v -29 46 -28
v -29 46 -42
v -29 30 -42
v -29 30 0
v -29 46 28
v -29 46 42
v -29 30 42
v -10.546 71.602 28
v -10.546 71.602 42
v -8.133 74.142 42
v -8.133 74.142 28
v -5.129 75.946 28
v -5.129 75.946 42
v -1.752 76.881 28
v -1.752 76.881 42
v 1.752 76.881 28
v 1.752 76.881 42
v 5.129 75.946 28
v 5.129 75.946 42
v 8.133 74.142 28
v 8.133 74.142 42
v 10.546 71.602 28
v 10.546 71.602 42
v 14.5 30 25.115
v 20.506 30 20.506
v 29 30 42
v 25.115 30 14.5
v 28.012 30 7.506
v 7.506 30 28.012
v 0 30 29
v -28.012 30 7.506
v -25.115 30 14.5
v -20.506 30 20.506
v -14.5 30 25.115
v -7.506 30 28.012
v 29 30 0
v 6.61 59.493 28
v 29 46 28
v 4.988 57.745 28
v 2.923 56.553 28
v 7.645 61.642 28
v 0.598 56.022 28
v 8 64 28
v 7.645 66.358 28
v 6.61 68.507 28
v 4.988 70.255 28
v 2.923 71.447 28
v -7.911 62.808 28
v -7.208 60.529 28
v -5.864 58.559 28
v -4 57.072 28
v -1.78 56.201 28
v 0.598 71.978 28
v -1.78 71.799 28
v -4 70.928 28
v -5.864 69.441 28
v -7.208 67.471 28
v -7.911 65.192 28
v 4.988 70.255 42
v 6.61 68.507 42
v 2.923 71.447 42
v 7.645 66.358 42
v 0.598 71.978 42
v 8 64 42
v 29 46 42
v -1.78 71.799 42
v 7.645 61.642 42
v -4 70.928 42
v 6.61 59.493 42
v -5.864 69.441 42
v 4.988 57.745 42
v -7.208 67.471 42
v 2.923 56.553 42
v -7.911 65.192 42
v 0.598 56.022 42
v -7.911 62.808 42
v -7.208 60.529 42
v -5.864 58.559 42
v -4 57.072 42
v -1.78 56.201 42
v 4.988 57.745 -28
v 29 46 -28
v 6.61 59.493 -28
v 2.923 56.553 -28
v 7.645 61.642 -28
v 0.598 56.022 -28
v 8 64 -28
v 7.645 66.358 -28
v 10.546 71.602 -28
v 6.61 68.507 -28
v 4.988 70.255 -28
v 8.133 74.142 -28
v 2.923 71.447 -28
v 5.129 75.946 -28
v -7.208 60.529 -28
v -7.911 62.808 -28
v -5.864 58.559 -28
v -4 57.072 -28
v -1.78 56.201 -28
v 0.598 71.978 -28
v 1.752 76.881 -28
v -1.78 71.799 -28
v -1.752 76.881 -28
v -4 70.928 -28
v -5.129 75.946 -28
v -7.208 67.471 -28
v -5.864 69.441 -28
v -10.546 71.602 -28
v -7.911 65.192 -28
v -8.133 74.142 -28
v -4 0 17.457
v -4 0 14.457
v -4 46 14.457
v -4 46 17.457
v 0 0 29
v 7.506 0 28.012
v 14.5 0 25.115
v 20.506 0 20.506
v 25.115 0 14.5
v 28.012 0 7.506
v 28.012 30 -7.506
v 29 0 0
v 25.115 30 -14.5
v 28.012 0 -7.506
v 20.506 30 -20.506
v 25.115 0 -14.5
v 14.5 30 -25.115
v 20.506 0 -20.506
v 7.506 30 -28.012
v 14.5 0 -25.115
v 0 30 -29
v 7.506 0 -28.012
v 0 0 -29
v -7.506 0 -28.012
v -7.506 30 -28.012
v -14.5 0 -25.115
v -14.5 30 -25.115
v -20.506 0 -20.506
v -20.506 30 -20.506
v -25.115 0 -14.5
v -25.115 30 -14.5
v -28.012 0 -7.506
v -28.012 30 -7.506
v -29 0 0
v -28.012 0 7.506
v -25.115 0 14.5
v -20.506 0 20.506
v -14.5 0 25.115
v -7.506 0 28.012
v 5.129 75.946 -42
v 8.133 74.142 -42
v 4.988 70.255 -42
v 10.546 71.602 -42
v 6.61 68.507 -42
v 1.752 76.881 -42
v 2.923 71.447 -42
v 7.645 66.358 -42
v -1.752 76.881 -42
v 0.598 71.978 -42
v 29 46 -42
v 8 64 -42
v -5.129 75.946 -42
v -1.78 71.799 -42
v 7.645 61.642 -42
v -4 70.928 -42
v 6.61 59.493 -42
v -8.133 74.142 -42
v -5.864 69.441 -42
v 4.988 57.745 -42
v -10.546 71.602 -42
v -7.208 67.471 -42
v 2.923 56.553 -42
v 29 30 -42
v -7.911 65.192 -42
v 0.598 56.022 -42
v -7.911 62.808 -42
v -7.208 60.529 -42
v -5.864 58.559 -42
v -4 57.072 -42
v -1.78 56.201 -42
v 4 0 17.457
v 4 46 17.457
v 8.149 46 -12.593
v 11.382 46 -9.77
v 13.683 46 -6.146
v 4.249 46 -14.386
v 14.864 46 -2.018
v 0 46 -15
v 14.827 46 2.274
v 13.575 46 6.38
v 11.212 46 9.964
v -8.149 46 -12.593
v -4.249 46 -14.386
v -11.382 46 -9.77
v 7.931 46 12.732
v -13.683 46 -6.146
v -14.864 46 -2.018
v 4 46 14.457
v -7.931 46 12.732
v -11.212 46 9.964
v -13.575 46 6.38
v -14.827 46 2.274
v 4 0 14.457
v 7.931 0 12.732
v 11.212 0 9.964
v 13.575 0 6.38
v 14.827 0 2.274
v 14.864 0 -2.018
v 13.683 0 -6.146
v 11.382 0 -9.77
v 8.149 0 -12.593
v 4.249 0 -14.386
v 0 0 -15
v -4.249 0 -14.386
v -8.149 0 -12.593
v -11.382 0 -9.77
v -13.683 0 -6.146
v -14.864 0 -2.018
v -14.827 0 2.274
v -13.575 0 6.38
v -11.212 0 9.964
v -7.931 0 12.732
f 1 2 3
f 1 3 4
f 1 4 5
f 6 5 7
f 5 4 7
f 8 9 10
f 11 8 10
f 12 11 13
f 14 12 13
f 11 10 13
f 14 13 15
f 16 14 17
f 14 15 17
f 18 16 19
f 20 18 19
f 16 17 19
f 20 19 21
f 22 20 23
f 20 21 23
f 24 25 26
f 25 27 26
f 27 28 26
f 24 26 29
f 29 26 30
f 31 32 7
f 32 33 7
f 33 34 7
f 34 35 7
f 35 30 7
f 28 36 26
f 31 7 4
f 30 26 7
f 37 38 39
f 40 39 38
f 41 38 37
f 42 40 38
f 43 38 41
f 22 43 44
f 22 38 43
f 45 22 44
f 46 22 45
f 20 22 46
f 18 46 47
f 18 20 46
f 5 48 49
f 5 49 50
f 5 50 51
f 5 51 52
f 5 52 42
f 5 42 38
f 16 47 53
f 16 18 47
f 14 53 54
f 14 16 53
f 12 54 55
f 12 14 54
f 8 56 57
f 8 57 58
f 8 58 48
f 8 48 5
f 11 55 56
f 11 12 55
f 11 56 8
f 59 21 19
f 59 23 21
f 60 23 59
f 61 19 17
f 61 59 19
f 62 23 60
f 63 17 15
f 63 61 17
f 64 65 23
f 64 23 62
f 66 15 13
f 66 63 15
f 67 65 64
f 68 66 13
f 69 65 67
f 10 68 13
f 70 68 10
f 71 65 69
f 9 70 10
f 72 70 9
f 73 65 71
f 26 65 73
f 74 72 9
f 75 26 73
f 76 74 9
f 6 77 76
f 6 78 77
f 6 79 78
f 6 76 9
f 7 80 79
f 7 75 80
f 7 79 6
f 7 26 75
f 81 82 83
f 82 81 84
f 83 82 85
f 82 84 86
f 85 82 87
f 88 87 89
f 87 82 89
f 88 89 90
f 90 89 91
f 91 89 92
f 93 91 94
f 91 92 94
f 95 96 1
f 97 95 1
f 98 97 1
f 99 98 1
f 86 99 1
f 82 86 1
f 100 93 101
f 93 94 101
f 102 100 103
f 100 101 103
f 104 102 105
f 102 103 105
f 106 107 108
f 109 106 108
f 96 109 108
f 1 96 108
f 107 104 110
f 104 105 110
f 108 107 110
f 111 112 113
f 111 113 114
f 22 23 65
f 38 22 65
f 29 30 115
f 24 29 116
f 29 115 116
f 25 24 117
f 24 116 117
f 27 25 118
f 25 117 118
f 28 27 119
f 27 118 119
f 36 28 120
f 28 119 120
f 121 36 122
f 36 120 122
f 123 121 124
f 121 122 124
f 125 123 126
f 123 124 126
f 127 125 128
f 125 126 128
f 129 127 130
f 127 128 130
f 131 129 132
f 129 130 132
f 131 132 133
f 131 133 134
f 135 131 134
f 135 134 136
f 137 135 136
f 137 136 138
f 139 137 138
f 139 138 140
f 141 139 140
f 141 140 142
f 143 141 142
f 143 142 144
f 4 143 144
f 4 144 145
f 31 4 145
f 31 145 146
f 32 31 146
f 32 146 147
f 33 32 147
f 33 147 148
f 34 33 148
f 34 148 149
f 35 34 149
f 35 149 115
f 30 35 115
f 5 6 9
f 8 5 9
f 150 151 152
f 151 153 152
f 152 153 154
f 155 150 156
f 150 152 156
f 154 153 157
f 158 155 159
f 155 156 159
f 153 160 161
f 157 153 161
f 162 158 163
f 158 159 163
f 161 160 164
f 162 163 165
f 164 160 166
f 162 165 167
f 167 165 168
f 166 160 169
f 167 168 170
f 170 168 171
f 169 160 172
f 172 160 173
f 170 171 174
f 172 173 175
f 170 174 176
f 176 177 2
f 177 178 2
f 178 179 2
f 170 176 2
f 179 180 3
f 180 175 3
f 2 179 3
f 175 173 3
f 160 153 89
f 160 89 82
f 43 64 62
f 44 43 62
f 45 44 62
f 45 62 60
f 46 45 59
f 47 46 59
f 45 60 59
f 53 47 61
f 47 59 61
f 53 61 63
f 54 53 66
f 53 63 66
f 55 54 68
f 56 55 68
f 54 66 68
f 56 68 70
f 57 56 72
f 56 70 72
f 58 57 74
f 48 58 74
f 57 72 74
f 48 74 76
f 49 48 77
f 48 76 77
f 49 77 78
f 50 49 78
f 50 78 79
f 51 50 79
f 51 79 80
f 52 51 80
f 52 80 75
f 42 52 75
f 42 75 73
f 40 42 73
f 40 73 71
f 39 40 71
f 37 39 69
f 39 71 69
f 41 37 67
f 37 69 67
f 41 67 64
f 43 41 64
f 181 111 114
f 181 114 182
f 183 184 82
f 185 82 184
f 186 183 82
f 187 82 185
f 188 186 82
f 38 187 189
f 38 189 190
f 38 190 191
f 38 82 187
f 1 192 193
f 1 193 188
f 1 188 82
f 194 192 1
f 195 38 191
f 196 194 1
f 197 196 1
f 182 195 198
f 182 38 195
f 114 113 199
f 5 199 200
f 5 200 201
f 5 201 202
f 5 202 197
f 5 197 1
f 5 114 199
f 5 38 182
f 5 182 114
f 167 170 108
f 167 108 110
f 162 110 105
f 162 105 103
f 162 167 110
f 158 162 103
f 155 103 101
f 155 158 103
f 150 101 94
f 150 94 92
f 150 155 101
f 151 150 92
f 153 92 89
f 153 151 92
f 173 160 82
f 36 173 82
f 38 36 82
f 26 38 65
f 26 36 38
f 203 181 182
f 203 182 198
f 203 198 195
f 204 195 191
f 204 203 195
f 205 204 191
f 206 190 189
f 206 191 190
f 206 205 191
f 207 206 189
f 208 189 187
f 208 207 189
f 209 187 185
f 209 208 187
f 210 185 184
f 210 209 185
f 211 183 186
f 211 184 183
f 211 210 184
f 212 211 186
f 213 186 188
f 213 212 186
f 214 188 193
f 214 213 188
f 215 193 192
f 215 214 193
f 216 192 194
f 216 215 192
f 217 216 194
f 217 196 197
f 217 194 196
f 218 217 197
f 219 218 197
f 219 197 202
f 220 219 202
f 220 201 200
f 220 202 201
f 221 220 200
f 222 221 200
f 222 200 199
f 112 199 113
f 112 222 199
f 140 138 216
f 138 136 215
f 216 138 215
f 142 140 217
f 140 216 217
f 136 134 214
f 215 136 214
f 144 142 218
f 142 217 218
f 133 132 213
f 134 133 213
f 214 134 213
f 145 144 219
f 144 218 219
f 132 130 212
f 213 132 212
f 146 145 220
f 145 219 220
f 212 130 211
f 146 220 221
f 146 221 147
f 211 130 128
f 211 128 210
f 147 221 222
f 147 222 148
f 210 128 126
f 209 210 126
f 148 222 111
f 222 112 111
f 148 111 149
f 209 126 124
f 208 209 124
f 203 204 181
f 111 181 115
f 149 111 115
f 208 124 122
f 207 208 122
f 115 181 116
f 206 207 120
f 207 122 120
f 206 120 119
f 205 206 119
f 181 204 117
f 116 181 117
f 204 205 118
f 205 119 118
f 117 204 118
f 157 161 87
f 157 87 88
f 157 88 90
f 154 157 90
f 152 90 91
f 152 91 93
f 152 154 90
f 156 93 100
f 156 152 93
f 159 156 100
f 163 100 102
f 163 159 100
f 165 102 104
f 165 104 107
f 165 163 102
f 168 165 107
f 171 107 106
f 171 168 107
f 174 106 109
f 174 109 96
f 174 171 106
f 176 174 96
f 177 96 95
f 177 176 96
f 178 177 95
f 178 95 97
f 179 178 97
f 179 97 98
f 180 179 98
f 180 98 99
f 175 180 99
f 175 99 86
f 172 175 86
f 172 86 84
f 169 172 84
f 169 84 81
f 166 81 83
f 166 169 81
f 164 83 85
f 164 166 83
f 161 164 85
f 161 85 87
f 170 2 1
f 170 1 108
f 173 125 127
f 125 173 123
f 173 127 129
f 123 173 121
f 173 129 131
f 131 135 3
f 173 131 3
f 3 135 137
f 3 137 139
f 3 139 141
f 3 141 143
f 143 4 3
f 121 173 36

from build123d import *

# Parameters (mm, degrees)
SKETCH1_R           = 29
BOSS_EXTRUDE1_DEPTH = 30
SKETCH3_W           = 58
SKETCH3_H           = 84
BOSS_EXTRUDE2_DEPTH = 16
SKETCH4_R           = 8
EXTRUDE_Q_DEPTH     = 14
CUT_EXTRUDE1_DEPTH  = 93.379651439


with BuildPart() as part:
    # Sketch1 → Boss-Extrude1 (new body)
    with BuildSketch(Plane(origin=(0, 0, 0), x_dir=(-1, 0, 0), z_dir=(0, 1, 0))):
        with Locations(Location((0, 0, 0), (0, 0, 90))):
            Circle(SKETCH1_R)
    extrude(amount=BOSS_EXTRUDE1_DEPTH)

    # Sketch3 → Boss-Extrude2 (add)
    with BuildSketch(Plane(origin=(0, 30, 0), x_dir=(-1, 0, 0), z_dir=(0, 1, 0))):
        Rectangle(SKETCH3_W, SKETCH3_H)
    extrude(amount=BOSS_EXTRUDE2_DEPTH)

    # Sketch4 → Extrude q (add)
    with BuildSketch(Plane.XY.offset(42)):
        with BuildLine():
            Line((-29, 30), (-29, 46))
            Line((-29, 46), (-10.54585016, 71.60164748))
            ThreePointArc((-10.54585016, 71.60164748), (0, 77), (10.54585016, 71.60164748))
            Line((10.54585016, 71.60164748), (29, 46))
            Line((29, 46), (29, 30))
            Line((29, 30), (-29, 30))
        make_face()
        with Locations((0, 64)):
            Circle(SKETCH4_R, mode=Mode.SUBTRACT)
    extrude_q = extrude(amount=-EXTRUDE_Q_DEPTH)

    # Mirror1: Extrude q across plane
    add(extrude_q.mirror(Plane.XY))

    # Sketch5 → Cut-Extrude1 (cut, through all)
    with BuildSketch(Plane.XZ):
        with BuildLine():
            Line((-4, 17.456832295), (4, 17.456832295))
            Line((4, 17.456832295), (4, 14.456832295))
            ThreePointArc((4, 14.456832295), (0, -15), (-4, 14.456832295))
            Line((-4, 14.456832295), (-4, 17.456832295))
        make_face()
    extrude(amount=-CUT_EXTRUDE1_DEPTH, mode=Mode.SUBTRACT)


solid = part.part
